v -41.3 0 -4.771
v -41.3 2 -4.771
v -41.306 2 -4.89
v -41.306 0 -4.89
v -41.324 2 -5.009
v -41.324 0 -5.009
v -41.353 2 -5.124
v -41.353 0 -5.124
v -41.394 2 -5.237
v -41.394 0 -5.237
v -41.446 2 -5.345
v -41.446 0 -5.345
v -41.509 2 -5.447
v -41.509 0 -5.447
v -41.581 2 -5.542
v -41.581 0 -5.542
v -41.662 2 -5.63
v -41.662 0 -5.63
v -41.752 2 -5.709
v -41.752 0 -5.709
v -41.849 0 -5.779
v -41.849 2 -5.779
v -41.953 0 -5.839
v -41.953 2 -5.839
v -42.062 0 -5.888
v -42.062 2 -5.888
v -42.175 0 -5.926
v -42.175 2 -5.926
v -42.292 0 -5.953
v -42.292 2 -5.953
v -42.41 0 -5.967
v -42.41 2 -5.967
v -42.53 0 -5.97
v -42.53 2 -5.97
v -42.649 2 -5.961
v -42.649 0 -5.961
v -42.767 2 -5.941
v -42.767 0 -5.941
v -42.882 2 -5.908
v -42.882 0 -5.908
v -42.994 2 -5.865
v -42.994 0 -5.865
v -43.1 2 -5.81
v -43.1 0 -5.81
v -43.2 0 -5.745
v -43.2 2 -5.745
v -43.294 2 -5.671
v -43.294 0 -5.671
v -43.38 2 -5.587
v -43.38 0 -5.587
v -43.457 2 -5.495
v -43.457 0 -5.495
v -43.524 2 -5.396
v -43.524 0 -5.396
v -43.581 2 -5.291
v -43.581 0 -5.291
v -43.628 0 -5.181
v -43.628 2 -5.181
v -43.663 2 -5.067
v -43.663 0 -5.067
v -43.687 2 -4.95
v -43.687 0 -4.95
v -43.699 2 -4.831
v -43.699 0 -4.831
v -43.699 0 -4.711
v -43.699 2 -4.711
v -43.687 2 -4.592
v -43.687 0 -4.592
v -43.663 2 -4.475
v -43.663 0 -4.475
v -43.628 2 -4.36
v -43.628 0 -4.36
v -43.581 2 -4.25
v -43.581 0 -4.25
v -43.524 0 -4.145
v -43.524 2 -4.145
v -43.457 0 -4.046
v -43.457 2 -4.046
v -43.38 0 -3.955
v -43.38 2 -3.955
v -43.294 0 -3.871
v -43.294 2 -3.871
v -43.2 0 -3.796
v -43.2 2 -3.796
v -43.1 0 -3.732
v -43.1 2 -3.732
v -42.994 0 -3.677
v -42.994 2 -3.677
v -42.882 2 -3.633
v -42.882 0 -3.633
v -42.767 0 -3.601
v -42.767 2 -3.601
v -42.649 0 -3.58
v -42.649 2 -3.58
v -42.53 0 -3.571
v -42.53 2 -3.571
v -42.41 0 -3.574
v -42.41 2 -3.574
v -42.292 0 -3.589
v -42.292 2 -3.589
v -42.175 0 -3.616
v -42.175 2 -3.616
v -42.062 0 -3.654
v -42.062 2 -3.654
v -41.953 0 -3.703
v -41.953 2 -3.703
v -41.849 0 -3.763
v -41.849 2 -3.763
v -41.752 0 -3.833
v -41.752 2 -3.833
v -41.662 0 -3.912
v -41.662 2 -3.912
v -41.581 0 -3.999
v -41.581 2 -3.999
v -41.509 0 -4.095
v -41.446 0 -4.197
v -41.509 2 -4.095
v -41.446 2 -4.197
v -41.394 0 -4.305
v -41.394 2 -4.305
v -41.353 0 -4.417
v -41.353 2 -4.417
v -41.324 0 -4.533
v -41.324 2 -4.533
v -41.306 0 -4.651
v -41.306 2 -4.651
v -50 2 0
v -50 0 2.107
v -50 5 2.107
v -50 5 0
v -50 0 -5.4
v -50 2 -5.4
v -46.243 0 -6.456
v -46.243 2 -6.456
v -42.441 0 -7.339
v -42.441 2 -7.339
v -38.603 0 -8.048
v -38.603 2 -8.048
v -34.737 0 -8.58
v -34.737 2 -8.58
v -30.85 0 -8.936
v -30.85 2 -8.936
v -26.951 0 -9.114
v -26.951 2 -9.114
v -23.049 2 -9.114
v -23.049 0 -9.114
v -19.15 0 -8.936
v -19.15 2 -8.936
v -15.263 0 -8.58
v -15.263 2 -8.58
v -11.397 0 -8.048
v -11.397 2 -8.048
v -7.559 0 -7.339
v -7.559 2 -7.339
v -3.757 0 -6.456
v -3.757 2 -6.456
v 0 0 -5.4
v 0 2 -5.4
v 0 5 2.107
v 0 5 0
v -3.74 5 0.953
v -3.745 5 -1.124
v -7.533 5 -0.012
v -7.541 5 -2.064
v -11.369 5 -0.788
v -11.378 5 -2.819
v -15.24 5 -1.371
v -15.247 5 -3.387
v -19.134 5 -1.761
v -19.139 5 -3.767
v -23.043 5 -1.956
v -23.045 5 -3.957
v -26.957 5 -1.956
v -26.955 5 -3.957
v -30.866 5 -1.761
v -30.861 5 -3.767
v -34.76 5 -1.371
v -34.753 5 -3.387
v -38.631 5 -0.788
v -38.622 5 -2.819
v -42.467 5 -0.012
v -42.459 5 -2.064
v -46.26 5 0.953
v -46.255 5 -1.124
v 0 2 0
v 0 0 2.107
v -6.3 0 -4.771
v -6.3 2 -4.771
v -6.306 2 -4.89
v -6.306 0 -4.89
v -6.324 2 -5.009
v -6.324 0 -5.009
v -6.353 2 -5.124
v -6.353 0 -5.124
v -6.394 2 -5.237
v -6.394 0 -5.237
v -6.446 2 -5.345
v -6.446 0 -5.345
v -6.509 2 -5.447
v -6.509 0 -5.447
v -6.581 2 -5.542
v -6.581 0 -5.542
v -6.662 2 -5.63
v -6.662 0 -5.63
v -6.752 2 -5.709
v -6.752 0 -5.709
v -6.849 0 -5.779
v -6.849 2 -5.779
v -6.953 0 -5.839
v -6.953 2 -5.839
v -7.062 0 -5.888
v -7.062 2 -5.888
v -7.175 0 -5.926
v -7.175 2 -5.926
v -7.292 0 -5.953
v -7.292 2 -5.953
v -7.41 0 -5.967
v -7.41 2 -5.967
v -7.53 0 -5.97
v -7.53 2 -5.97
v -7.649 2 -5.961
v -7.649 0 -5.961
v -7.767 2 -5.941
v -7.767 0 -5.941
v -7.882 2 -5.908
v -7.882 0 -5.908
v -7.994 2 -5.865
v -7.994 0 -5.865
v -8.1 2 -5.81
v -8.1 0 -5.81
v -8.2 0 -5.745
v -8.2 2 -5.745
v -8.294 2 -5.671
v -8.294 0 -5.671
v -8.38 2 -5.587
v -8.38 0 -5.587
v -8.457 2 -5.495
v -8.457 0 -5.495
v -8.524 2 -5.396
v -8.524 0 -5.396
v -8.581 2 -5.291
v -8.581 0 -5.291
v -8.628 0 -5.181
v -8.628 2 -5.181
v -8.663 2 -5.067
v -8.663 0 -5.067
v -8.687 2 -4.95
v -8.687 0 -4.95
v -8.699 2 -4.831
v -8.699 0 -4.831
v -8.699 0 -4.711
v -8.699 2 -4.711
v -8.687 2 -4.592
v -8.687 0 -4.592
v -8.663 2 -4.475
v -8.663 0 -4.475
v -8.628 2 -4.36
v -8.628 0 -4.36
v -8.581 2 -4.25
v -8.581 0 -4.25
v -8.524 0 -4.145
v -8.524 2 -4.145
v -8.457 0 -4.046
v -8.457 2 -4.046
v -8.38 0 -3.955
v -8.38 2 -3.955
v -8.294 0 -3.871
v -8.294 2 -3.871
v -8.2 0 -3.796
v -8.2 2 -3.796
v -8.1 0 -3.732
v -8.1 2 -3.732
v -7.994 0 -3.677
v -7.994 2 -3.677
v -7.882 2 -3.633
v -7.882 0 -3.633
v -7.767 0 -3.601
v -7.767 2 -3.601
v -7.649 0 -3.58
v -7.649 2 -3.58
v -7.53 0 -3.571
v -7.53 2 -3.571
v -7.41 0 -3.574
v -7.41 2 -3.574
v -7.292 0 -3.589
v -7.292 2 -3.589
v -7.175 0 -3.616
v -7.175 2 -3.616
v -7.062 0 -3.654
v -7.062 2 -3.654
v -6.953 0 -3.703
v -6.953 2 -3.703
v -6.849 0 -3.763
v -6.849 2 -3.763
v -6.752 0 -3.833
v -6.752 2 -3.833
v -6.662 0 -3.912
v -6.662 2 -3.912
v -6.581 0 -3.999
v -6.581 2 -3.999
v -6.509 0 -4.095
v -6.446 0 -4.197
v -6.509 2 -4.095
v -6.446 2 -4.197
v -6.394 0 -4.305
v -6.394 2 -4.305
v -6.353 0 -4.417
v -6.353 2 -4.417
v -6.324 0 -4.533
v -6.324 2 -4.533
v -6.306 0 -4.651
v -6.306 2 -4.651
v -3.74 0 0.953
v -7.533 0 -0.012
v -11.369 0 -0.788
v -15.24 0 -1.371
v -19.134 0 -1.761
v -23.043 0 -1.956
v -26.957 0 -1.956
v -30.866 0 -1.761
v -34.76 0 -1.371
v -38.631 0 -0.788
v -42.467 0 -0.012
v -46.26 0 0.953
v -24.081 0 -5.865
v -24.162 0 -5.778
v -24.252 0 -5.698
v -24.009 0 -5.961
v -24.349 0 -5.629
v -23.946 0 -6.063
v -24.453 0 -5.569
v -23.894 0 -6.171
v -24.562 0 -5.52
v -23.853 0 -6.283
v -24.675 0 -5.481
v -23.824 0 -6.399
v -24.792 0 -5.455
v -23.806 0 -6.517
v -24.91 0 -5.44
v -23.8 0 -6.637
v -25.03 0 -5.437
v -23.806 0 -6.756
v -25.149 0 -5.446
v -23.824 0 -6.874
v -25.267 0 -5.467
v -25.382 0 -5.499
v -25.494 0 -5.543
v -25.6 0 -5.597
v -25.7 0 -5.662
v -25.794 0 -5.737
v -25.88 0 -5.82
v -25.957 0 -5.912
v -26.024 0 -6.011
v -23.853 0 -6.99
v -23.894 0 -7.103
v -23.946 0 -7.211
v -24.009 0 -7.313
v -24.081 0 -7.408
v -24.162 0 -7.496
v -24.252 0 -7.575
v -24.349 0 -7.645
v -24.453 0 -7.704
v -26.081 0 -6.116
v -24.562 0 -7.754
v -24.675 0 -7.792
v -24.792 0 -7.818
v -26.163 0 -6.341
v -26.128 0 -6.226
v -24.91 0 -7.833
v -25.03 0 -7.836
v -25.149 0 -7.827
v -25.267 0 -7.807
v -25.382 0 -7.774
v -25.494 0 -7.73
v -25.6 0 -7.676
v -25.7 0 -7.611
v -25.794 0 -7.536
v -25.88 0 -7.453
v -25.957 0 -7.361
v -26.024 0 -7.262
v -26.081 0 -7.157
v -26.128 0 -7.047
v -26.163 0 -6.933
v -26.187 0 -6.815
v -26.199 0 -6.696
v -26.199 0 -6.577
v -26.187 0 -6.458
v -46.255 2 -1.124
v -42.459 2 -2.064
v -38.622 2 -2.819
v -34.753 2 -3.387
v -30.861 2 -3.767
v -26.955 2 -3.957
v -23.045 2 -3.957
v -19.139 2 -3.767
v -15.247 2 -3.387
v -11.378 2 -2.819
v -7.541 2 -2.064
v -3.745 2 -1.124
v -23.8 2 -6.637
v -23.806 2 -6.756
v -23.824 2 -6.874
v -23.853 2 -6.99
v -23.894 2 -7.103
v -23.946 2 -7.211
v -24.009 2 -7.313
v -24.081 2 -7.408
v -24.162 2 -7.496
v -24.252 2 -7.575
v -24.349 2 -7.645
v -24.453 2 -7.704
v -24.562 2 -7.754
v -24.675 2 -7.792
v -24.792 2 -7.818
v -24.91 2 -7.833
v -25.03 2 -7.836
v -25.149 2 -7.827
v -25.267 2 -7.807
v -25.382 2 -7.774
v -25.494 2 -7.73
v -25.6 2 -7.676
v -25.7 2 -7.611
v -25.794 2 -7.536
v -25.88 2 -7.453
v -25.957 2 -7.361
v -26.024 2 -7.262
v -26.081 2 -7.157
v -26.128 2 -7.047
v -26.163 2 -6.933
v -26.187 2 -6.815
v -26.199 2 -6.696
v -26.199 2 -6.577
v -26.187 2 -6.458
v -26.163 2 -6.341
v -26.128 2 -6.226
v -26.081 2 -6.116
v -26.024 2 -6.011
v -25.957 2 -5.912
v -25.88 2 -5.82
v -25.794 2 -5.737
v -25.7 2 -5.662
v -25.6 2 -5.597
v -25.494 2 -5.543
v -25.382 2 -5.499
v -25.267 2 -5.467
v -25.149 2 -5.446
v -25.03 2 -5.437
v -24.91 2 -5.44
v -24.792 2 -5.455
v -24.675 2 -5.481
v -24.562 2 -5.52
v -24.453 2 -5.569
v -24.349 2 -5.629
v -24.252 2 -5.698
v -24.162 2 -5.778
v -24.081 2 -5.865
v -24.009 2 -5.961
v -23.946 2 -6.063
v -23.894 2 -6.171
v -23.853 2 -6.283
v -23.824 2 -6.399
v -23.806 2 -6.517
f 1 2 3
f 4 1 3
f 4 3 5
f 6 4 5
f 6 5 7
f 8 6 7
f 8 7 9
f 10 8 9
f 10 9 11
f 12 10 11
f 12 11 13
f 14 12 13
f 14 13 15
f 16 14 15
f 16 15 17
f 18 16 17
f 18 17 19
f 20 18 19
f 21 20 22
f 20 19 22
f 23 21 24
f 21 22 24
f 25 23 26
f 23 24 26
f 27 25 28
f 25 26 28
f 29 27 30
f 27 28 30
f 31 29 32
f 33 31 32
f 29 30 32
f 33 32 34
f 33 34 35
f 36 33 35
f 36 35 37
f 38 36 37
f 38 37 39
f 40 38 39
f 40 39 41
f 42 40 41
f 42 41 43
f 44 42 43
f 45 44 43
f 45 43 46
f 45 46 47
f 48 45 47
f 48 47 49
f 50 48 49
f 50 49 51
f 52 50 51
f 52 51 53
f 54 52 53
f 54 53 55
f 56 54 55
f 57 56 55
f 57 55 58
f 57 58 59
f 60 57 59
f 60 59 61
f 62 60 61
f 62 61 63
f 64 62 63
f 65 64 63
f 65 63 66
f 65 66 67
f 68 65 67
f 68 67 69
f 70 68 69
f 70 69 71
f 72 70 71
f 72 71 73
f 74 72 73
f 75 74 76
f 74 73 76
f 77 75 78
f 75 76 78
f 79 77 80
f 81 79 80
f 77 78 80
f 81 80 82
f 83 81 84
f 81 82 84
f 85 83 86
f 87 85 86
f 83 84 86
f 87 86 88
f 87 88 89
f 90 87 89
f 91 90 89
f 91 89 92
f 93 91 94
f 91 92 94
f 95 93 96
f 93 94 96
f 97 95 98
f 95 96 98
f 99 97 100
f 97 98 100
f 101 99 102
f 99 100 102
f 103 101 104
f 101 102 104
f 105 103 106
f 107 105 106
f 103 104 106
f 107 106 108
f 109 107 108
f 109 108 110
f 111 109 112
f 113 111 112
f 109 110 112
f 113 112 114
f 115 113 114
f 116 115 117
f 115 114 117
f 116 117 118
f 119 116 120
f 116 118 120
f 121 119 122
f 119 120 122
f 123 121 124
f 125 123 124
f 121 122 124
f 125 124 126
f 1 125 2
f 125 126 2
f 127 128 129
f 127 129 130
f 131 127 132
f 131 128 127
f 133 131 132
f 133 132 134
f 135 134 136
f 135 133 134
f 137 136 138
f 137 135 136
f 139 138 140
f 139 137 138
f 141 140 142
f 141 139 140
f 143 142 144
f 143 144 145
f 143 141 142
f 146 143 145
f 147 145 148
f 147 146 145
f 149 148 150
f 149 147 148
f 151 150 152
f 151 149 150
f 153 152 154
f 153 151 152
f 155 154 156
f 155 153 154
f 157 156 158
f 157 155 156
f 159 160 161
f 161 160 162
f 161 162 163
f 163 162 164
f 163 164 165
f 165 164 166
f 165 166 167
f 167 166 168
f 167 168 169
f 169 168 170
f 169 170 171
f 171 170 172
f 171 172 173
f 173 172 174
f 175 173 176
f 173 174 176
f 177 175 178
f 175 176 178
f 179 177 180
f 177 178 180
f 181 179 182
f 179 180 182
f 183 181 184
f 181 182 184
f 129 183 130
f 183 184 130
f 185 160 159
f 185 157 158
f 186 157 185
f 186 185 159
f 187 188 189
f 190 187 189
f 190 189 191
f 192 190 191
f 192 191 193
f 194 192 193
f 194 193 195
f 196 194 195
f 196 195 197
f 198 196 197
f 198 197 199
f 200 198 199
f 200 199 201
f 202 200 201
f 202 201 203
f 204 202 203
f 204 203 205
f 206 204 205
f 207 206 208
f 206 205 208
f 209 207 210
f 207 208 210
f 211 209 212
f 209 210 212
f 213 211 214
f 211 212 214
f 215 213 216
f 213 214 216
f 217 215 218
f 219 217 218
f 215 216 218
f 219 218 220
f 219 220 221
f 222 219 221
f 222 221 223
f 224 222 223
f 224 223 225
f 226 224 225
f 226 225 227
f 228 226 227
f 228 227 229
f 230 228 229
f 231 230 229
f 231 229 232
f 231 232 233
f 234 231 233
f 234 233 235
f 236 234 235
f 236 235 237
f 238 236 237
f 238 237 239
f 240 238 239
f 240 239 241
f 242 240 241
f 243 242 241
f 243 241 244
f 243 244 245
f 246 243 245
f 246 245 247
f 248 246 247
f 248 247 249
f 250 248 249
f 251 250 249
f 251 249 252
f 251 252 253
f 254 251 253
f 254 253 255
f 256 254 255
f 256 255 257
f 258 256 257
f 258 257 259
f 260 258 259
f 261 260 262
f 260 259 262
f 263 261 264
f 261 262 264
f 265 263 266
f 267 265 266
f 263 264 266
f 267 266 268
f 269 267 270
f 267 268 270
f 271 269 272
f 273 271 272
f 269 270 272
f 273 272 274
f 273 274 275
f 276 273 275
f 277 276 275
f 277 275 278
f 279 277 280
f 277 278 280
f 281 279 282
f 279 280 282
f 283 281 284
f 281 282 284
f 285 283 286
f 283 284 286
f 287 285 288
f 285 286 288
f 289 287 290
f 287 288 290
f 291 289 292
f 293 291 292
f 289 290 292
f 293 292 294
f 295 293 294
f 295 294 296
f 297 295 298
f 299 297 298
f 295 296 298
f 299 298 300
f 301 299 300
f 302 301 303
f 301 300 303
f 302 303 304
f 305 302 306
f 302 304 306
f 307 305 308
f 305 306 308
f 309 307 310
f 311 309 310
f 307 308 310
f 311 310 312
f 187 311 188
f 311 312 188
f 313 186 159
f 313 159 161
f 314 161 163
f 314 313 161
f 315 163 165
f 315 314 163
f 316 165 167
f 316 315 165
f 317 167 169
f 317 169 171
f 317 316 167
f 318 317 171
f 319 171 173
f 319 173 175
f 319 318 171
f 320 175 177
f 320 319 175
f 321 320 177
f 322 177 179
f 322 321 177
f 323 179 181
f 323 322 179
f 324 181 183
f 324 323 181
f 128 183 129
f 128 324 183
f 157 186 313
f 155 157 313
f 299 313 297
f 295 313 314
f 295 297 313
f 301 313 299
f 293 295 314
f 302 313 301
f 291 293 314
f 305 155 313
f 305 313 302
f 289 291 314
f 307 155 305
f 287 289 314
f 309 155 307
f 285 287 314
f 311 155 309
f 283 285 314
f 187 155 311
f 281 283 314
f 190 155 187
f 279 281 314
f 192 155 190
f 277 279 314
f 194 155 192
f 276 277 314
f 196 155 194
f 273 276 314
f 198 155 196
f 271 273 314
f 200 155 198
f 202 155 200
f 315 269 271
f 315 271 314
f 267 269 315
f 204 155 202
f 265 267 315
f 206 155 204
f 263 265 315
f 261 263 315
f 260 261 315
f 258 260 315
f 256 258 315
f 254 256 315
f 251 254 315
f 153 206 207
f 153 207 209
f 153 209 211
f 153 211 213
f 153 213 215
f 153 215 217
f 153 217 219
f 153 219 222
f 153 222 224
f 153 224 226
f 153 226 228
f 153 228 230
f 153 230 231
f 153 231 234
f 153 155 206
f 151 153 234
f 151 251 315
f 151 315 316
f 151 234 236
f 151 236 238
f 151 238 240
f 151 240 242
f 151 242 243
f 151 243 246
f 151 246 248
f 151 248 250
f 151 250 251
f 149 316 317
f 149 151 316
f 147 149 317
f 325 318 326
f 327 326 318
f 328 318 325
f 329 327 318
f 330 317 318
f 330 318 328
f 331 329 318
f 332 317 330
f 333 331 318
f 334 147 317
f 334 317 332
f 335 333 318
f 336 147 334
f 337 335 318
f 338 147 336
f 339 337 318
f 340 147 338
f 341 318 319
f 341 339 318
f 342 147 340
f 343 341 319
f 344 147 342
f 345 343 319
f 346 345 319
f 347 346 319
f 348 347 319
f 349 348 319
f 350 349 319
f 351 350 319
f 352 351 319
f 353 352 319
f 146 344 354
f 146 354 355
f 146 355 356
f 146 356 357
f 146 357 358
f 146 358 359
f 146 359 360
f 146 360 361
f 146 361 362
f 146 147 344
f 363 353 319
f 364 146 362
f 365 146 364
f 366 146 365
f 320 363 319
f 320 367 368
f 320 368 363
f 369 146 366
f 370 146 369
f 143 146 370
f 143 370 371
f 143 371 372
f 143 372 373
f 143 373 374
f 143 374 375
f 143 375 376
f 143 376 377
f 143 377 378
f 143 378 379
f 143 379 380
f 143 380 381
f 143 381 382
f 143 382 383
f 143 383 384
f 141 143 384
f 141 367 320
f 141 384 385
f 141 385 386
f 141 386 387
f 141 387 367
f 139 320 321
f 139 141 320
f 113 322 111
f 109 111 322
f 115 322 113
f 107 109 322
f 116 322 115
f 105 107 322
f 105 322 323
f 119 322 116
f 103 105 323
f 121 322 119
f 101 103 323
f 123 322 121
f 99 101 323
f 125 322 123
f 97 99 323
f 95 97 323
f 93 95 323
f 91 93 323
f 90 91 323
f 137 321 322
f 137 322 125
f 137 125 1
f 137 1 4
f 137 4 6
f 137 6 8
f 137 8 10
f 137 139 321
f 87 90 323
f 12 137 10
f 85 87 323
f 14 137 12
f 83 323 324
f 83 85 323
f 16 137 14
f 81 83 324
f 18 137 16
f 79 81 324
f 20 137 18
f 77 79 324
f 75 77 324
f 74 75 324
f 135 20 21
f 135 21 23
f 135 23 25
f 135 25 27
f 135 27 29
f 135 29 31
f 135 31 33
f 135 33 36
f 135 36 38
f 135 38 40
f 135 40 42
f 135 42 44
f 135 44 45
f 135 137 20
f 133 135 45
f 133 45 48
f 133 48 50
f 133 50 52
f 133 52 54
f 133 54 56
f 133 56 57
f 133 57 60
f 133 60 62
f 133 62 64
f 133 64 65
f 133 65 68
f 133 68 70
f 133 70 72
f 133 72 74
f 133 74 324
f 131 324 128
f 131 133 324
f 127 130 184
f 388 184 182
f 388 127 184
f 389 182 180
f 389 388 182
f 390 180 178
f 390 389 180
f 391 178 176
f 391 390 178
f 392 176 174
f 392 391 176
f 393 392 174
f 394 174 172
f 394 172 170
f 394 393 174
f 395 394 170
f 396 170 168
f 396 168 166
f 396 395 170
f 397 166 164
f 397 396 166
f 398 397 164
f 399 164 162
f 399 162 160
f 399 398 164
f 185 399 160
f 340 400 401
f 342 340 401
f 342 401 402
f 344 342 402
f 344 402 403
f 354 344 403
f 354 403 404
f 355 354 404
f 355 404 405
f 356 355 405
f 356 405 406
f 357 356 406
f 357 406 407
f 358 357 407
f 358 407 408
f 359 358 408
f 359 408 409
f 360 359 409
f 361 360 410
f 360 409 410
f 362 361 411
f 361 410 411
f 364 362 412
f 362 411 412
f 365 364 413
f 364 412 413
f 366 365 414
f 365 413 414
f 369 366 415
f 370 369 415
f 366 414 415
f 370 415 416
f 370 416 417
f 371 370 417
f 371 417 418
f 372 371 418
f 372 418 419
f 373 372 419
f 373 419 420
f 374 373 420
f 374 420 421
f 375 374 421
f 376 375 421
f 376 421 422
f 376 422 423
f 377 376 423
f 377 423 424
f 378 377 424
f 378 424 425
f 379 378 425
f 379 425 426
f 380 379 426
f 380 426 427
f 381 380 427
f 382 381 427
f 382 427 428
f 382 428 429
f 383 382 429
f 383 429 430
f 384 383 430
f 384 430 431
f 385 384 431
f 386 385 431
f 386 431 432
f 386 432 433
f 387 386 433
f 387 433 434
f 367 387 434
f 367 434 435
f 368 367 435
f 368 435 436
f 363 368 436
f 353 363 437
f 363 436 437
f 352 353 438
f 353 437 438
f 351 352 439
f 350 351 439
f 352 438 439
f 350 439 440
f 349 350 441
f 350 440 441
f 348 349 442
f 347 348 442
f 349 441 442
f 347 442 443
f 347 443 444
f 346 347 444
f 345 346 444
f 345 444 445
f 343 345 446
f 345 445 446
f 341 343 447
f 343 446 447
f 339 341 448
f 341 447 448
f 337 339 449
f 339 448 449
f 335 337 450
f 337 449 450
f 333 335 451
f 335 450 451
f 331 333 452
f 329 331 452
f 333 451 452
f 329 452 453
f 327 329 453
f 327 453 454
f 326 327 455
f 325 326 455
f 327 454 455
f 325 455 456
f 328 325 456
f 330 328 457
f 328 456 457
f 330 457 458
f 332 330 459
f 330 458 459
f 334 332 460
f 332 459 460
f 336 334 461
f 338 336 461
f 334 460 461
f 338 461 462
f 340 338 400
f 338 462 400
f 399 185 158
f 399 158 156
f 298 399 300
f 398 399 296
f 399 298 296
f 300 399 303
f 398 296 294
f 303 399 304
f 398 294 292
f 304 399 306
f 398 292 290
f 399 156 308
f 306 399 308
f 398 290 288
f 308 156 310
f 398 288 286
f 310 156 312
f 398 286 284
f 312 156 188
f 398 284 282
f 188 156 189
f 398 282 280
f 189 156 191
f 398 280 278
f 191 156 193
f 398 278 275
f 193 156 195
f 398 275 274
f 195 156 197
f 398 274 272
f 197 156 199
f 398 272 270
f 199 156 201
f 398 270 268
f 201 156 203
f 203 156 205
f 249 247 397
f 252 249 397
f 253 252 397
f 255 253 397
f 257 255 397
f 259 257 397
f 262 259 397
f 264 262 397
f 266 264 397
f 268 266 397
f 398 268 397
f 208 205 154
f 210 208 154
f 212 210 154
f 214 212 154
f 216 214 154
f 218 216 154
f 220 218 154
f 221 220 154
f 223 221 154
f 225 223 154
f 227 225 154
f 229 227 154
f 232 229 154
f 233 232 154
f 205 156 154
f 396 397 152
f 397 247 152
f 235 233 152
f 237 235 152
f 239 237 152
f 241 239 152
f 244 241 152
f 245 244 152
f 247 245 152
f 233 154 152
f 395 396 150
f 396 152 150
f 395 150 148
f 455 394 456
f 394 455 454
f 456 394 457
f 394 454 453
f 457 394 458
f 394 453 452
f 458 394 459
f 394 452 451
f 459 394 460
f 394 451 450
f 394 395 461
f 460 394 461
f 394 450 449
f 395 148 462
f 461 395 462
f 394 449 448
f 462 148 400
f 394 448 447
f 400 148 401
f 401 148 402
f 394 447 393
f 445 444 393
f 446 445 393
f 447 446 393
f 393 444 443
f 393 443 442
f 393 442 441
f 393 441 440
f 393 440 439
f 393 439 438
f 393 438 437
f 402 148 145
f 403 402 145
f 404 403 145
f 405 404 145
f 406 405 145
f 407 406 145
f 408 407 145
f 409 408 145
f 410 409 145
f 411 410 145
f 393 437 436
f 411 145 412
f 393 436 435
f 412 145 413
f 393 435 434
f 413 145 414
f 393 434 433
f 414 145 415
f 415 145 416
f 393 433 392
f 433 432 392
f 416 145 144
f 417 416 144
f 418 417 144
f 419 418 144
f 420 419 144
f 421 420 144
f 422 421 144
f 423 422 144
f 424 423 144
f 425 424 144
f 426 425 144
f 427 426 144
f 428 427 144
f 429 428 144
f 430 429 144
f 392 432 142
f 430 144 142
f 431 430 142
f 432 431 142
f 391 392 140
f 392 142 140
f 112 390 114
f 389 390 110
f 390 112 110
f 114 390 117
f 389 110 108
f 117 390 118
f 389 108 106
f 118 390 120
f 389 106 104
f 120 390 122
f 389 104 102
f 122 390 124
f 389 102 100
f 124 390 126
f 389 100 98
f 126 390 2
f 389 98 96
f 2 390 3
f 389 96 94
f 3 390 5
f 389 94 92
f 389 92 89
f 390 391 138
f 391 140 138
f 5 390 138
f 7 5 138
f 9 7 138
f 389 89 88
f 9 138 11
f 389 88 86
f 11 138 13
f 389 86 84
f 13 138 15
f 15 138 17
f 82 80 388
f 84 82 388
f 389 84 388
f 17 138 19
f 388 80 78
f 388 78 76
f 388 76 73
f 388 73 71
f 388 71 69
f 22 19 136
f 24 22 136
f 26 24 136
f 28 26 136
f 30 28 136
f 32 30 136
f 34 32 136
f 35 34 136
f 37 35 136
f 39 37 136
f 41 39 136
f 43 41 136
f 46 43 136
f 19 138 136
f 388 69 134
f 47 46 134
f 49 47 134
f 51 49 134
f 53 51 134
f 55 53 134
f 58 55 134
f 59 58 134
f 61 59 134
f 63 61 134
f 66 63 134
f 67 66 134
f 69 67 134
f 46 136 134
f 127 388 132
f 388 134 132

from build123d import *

# Parameters (mm, degrees)
EXTRUDE_1_DEPTH   = 2
EXTRUDE_2_DEPTH   = 5
HOLE_WIZARD_M21_D = 2.4


with BuildPart() as part:
    # Эскиз1 → Бобышка-Вытянуть1 (new body)
    with BuildSketch(Plane(origin=(0, 0, 0), x_dir=(1, 0, 0), z_dir=(0, 1, 0))):
        with BuildLine():
            ThreePointArc((0, 0), (-25, 3.980394669), (-50, 0))
            Line((-50, 0), (-50, 5.4))
            ThreePointArc((-50, 5.4), (-25, 9.13662189), (0, 5.4))
            Line((0, 5.4), (0, 0))
        make_face()
    extrude(amount=EXTRUDE_1_DEPTH)

    # Эскиз1<3> → Бобышка-Вытянуть2 (add)
    with BuildSketch(Plane(origin=(0, 0, 0), x_dir=(1, 0, 0), z_dir=(0, 1, 0))):
        with BuildLine():
            Line((-50, -2.106904802), (-50, 0))
            ThreePointArc((-50, 0), (-25, 3.980394669), (0, 0))
            Line((0, 0), (0, -2.106904802))
            ThreePointArc((0, -2.106904802), (-25, 1.980394669), (-50, -2.106904802))
        make_face()
    extrude(amount=EXTRUDE_2_DEPTH)

    # Отверстие с зазором M21 (through all)
    with Locations(Plane(origin=(0, 0, 0), x_dir=(-1, 0, 0), z_dir=(0, -1, 0))):
        with Locations((42.5, 4.770770064), (25, 6.63662189), (7.5, 4.770770064)):
            Hole(HOLE_WIZARD_M21_D / 2)


solid = part.part
